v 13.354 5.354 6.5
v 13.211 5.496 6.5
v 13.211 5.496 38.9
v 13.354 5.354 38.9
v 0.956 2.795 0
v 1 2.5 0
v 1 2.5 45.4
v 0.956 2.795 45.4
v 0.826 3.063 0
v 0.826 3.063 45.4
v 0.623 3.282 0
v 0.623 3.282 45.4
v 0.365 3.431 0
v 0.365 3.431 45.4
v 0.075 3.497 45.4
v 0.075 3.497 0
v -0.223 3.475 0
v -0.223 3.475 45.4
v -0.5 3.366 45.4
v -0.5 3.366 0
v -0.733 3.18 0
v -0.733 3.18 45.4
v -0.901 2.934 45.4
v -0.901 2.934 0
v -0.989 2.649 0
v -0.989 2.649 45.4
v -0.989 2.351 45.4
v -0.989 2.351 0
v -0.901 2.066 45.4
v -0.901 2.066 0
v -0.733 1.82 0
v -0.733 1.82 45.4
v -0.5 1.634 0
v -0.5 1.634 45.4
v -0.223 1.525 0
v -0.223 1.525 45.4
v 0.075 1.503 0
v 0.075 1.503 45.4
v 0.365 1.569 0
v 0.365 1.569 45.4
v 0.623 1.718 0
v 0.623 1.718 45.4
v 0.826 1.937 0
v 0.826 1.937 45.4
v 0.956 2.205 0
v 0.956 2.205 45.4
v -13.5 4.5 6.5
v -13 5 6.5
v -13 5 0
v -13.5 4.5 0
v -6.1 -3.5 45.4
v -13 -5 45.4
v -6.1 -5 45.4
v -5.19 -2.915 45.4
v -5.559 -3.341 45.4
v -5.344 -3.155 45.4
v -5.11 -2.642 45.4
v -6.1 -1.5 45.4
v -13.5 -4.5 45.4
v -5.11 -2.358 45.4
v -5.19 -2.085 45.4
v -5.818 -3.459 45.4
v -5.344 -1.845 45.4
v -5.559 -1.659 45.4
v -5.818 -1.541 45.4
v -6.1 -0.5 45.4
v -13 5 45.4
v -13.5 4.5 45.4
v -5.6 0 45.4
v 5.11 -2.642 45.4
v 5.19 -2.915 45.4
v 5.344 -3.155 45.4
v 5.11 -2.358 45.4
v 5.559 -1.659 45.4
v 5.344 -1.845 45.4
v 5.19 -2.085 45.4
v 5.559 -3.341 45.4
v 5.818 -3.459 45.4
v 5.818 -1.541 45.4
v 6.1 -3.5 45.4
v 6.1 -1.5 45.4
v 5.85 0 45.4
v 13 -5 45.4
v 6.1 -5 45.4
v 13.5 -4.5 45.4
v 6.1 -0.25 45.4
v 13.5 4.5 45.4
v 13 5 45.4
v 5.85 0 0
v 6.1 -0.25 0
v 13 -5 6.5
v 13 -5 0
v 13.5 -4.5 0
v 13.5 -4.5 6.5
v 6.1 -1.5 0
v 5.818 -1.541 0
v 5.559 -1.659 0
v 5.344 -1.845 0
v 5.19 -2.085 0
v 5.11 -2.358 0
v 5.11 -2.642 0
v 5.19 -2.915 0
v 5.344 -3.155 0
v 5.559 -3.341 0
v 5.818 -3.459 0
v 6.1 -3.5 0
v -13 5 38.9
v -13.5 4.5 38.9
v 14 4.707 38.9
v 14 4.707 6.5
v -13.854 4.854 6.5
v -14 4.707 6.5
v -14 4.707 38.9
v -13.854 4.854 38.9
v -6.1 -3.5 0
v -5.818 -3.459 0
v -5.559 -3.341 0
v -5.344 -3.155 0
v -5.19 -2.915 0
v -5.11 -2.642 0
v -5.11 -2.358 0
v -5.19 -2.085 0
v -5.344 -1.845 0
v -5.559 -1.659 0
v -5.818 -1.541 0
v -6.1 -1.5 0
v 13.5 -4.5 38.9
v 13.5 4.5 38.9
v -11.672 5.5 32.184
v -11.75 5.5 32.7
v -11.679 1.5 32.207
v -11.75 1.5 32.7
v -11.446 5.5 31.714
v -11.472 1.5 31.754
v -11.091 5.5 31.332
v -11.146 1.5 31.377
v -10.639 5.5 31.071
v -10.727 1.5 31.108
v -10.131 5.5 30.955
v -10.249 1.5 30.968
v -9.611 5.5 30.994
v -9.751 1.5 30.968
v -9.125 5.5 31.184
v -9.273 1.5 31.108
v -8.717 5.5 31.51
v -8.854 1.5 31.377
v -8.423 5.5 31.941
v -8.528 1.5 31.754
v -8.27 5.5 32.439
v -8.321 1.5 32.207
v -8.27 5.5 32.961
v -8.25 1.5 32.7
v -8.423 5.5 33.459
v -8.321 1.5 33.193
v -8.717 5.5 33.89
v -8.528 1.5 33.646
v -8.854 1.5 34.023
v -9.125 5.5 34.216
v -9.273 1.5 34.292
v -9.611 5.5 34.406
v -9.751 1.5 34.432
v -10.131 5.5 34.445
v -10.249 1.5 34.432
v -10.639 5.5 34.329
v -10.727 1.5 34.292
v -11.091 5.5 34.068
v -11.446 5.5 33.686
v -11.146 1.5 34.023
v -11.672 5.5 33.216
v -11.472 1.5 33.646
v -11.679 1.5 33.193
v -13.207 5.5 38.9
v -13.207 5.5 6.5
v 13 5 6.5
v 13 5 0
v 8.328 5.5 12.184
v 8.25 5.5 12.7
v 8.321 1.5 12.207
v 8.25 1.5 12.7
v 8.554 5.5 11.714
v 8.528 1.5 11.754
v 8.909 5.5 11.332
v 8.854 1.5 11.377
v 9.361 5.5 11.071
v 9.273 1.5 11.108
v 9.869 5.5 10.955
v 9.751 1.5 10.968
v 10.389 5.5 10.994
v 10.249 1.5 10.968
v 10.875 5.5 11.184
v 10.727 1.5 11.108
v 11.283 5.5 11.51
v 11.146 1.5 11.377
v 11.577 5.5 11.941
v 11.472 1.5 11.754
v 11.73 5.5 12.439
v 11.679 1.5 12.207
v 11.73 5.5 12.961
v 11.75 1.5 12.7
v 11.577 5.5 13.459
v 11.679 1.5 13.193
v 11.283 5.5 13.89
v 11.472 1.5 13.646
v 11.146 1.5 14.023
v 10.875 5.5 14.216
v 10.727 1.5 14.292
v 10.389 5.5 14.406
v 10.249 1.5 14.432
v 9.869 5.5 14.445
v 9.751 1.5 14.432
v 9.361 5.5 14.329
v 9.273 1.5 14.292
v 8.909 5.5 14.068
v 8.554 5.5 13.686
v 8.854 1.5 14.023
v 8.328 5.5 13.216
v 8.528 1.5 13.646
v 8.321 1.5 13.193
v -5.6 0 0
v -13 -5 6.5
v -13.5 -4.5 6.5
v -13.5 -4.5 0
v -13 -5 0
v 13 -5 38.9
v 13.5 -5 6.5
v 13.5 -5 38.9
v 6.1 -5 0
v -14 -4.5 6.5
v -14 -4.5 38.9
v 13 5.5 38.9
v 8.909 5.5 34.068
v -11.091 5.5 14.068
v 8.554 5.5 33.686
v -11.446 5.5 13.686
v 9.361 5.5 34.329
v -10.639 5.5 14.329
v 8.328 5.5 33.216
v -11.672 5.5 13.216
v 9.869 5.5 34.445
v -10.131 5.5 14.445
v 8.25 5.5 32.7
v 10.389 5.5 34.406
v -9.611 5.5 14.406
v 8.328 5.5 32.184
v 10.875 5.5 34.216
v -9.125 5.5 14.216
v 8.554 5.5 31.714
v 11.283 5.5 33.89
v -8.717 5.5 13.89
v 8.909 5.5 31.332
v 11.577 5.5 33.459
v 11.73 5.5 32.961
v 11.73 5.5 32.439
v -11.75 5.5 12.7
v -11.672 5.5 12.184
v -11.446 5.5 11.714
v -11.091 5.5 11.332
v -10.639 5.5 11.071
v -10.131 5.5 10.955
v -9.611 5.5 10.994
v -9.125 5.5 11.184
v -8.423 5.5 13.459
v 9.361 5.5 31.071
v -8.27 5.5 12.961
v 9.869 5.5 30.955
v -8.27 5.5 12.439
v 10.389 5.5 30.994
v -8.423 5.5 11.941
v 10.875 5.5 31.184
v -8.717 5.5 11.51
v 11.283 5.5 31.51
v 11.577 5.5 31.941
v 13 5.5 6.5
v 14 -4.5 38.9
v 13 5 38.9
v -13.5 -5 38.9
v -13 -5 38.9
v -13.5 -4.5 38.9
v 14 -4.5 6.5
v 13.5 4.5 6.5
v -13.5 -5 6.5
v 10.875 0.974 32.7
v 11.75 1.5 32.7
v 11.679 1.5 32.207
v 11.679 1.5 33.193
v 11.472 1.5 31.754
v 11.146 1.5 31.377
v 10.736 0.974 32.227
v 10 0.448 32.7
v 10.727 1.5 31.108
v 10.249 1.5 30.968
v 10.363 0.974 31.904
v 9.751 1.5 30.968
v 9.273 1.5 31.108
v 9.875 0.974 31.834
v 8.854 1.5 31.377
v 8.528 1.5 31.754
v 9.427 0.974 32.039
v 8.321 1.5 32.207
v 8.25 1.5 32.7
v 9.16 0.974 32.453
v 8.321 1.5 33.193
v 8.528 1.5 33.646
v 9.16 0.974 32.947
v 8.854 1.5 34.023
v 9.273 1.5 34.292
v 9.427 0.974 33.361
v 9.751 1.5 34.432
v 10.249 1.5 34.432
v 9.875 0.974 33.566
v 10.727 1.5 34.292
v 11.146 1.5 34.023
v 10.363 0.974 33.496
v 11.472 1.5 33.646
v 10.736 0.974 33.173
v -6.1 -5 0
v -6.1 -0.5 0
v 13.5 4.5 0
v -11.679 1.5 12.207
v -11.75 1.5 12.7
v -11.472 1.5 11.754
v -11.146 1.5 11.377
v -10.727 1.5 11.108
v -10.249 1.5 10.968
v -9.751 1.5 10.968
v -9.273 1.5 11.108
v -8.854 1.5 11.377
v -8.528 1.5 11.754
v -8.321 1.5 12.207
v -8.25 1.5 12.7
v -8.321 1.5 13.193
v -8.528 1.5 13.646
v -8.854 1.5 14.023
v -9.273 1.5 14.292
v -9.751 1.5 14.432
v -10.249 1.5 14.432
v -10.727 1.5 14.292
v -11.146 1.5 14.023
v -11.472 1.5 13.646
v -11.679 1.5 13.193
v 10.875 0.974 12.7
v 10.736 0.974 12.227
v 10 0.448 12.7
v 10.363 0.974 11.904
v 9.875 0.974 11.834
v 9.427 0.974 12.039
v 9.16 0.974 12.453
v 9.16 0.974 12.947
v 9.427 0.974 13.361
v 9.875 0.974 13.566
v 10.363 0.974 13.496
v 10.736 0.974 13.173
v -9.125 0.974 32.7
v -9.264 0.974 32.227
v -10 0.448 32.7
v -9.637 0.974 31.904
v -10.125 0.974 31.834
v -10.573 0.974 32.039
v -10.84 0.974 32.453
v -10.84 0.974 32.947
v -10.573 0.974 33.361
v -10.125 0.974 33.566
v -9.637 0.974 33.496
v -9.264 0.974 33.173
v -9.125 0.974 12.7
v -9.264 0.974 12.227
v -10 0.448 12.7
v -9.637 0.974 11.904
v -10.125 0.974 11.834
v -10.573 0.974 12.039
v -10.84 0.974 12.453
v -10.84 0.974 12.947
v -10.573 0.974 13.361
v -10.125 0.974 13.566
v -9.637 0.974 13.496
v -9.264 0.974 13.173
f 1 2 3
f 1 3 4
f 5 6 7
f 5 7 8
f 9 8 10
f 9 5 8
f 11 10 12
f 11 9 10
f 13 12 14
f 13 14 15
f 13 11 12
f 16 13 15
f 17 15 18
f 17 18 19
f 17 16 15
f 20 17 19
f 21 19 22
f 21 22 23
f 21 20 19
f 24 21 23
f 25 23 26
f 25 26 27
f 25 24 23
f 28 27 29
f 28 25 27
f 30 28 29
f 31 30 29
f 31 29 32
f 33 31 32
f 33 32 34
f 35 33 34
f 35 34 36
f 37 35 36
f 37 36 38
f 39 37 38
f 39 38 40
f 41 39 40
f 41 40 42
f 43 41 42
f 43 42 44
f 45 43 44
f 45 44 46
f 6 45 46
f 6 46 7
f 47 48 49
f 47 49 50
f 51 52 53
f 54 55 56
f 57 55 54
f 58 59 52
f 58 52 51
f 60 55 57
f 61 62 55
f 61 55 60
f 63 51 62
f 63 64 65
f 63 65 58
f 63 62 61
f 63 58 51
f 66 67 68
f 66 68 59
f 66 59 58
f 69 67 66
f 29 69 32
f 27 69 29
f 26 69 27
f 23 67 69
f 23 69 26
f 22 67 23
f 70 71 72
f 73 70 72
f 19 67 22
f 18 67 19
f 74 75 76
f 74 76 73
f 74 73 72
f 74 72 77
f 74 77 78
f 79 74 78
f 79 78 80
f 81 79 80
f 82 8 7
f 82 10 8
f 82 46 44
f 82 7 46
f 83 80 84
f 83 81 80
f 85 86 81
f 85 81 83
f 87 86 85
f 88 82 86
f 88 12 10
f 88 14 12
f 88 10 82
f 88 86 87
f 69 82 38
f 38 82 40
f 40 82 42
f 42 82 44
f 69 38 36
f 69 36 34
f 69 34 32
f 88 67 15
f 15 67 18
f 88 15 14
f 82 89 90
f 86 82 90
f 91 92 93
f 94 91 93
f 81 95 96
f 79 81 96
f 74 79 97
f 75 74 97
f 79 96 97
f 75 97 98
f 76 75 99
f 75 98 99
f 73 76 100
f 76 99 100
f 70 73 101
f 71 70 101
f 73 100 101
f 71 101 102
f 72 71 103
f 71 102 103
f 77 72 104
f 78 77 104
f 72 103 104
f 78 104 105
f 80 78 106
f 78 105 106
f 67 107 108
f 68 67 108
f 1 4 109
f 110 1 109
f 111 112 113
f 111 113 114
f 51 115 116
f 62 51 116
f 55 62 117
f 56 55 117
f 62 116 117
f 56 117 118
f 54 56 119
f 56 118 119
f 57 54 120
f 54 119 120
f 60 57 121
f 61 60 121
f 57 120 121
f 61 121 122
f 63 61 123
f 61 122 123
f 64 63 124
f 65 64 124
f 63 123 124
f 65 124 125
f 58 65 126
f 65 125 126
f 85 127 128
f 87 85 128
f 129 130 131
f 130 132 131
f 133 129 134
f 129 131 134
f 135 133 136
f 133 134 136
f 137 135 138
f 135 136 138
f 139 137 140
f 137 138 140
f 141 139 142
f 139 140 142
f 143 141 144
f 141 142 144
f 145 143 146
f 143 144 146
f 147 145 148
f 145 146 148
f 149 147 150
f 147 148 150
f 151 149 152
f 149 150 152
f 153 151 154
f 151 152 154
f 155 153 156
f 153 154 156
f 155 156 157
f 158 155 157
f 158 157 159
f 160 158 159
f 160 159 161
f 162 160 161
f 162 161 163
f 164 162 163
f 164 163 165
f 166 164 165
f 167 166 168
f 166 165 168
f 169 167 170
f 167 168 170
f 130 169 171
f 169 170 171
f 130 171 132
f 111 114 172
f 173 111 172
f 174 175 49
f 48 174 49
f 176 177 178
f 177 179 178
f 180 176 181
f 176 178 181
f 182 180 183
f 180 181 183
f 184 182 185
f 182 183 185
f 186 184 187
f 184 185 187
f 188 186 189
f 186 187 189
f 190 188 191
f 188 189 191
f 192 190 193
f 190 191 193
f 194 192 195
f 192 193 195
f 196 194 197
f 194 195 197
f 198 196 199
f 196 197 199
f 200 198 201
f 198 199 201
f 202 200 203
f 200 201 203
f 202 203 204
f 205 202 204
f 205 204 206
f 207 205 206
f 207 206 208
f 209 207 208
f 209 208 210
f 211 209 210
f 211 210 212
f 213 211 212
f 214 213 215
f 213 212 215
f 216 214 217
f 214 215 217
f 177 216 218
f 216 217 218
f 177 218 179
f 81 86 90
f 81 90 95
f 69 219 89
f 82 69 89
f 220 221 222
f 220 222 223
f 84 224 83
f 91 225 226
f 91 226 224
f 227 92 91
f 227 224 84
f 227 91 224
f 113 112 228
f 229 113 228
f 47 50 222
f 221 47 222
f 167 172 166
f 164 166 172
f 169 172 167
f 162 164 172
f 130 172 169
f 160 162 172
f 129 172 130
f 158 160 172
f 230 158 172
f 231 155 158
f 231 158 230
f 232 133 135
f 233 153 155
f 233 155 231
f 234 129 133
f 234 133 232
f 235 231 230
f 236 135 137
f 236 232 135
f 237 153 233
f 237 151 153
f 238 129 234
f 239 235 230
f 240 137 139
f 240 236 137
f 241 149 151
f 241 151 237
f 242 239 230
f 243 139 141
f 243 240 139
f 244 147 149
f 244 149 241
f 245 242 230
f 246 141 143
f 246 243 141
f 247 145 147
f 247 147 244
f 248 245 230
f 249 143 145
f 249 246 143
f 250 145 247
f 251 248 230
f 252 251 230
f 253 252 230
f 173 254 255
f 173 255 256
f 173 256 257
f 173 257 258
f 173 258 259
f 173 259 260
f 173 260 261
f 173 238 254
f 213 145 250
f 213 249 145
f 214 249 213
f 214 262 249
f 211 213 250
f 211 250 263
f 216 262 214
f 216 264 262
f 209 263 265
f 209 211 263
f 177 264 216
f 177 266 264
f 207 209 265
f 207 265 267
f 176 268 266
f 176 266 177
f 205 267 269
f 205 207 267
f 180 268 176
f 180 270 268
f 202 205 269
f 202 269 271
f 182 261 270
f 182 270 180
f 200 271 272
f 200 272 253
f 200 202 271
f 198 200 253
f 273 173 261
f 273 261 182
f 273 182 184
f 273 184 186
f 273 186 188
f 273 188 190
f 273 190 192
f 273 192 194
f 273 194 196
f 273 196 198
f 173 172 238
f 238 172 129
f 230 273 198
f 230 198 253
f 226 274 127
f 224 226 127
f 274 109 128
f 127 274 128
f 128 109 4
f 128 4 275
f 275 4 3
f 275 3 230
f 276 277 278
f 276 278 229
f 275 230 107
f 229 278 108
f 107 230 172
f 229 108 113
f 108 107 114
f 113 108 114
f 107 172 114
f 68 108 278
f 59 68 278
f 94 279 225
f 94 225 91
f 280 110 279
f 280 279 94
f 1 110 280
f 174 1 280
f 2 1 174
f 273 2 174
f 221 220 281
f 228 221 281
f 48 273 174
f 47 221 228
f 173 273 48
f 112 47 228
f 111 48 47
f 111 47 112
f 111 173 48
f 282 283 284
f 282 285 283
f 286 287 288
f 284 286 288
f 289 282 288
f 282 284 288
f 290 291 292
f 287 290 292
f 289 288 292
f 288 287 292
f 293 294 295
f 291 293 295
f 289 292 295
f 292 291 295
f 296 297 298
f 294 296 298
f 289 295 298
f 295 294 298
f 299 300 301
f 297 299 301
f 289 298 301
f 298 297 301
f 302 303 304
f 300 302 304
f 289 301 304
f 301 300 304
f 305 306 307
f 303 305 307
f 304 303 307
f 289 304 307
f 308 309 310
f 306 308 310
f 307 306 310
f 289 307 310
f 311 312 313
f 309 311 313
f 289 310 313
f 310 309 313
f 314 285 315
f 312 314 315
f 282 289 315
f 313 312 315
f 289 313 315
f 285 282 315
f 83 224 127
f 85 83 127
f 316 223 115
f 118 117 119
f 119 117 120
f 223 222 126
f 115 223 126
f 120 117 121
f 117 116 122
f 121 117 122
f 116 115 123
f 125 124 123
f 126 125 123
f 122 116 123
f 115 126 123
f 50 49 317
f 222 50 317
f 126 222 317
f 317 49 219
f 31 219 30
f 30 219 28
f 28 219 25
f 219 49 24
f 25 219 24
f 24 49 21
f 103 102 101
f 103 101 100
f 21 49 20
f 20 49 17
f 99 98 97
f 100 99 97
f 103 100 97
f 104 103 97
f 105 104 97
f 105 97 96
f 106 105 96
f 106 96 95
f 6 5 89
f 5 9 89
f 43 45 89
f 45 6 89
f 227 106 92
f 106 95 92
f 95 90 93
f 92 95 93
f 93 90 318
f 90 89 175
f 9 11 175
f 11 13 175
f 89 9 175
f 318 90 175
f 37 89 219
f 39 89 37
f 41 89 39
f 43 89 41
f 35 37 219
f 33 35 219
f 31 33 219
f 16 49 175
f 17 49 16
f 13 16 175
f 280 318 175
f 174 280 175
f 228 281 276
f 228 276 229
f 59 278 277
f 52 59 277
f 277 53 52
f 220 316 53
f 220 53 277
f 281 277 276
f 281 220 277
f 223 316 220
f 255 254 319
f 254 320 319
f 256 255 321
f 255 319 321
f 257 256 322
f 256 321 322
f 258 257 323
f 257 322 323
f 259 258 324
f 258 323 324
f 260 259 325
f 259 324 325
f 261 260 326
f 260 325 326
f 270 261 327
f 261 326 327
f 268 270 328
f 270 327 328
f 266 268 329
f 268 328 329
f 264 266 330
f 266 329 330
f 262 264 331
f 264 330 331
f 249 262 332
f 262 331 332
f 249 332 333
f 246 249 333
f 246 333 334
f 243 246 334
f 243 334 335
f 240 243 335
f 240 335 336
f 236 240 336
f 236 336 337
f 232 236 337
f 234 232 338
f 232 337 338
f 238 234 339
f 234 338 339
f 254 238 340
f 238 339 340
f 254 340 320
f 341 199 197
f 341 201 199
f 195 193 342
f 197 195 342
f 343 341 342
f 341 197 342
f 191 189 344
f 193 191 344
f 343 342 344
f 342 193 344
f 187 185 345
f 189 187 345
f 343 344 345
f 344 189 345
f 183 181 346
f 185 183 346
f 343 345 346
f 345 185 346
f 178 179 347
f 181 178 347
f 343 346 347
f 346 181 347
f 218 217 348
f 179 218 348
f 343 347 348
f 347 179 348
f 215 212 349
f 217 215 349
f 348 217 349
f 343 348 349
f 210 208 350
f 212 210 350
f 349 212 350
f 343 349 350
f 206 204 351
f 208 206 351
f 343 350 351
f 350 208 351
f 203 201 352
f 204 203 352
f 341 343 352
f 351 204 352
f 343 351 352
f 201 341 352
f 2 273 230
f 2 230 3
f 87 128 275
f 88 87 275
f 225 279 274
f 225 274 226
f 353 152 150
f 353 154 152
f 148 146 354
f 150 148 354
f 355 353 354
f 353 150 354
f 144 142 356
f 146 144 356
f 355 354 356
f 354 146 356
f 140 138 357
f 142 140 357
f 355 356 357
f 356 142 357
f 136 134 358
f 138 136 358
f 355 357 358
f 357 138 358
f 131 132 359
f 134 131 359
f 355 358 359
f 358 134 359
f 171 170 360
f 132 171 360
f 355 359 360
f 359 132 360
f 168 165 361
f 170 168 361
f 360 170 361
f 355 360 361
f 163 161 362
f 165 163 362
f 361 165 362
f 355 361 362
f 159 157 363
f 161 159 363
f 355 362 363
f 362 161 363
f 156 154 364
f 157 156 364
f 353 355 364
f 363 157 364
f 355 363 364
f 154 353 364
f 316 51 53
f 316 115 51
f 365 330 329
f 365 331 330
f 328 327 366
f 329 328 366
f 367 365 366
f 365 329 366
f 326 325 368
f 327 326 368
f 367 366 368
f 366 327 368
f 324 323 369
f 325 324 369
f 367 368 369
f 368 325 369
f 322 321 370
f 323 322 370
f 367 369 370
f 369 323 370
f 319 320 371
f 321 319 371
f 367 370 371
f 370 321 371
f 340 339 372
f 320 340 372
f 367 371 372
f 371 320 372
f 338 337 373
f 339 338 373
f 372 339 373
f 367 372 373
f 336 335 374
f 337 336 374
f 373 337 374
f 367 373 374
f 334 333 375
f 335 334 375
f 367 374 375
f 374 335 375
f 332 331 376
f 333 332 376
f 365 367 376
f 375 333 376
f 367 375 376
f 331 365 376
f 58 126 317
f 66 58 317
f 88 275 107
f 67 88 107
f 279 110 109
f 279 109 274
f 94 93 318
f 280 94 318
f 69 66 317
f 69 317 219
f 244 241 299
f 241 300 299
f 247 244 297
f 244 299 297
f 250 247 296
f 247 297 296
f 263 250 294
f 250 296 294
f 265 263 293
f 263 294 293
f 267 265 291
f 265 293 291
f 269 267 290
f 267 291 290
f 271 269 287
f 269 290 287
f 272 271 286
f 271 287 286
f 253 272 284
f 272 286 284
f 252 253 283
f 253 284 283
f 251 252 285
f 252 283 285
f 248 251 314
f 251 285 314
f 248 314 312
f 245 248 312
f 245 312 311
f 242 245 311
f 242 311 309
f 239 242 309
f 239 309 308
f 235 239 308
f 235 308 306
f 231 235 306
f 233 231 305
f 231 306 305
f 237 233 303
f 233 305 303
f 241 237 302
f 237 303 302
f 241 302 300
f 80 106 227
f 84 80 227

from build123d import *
from build123d.topology import SkipClean

# Parameters (mm, degrees)
SKETCH1_R                 = 1
BOSS_EXTRUDE1_DEPTH       = 45.4
BOSS_EXTRUDE2_START       = -38.9
SKETCH5_R                 = 1
BOSS_EXTRUDE2_DEPTH       = 32.4
M5X0_8_TAPPED_HOLE1_D     = 3.5
M5X0_8_TAPPED_HOLE1_DEPTH = 4
M5X0_8_TAPPED_HOLE1_TIP   = 1.051506083


with BuildPart() as part:
    # Sketch1 → Boss-Extrude1 (new body)
    with BuildSketch(Plane.XY):
        with BuildLine():
            Line((-13.5, -4.5), (-13, -5))
            Line((-13, -5), (-6.1, -5))
            Line((-6.1, -5), (-6.1, -3.5))
            ThreePointArc((-6.1, -3.5), (-5.1, -2.5), (-6.1, -1.5))
            Line((-6.1, -1.5), (-6.1, -0.5))
            Line((-6.1, -0.5), (-5.6, 0))
            Line((-5.6, 0), (5.85, 0))
            Line((5.85, 0), (6.1, -0.25))
            Line((6.1, -0.25), (6.1, -1.5))
            ThreePointArc((6.1, -1.5), (5.1, -2.5), (6.1, -3.5))
            Line((6.1, -3.5), (6.1, -5))
            Line((6.1, -5), (13, -5))
            Line((13, -5), (13.5, -4.5))
            Line((13.5, -4.5), (13.5, 4.5))
            Line((13.5, 4.5), (13, 5))
            Line((13, 5), (-13, 5))
            Line((-13, 5), (-13.5, 4.5))
            Line((-13.5, 4.5), (-13.5, -4.5))
        make_face()
        with Locations((0, 2.5)):
            Circle(SKETCH1_R, mode=Mode.SUBTRACT)
    extrude(amount=BOSS_EXTRUDE1_DEPTH)

    # Sketch5 → Boss-Extrude2 (add)
    with SkipClean():  # the faces are left unmerged after this step: merging them gives an invalid solid
        with BuildSketch(Plane.XY.offset(45.4).offset(BOSS_EXTRUDE2_START)):
            with BuildLine():
                Line((13, 5.5), (13.210808273, 5.496298508))
                Line((13.210808273, 5.496298508), (13.353553391, 5.353553391))
                Line((13.353553391, 5.353553391), (14, 4.707106781))
                Line((14, 4.707106781), (14, -4.5))
                Line((14, -4.5), (13.5, -5))
                Line((13.5, -5), (6.1, -5))
                Line((6.1, -5), (6.1, -3.5))
                ThreePointArc((6.1, -3.5), (5.1, -2.5), (6.1, -1.5))
                Line((6.1, -1.5), (6.1, -0.25))
                Line((6.1, -0.25), (5.85, 0))
                Line((5.85, 0), (-5.6, 0))
                Line((-5.6, 0), (-6.1, -0.5))
                Line((-6.1, -0.5), (-6.1, -1.5))
                ThreePointArc((-6.1, -1.5), (-5.1, -2.5), (-6.1, -3.5))
                Line((-6.1, -3.5), (-6.1, -5))
                Line((-6.1, -5), (-13.5, -5))
                Line((-13.5, -5), (-14, -4.5))
                Line((-14, -4.5), (-14, 4.5))
                Line((-14, 4.5), (-14, 4.707106781))
                Line((-14, 4.707106781), (-13.853553391, 4.853553391))
                Line((-13.853553391, 4.853553391), (-13.207106781, 5.5))
                Line((-13.207106781, 5.5), (13, 5.5))
            make_face()
            with Locations((0, 2.5)):
                Circle(SKETCH5_R, mode=Mode.SUBTRACT)
        extrude(amount=BOSS_EXTRUDE2_DEPTH)
    add(part.part.scale(1), mode=Mode.REPLACE)  # the faces are merged on a copy

    # M5x0.8 Tapped Hole1
    with Locations(Plane(origin=(0, 5.5, 0), x_dir=(1, 0, 0), z_dir=(0, 1, 0))):
        with Locations((-10, -12.7), (-10, -32.7), (10, -32.7), (10, -12.7)):
            Hole(M5X0_8_TAPPED_HOLE1_D / 2, depth=M5X0_8_TAPPED_HOLE1_DEPTH)
            with Locations((0, 0, -(M5X0_8_TAPPED_HOLE1_DEPTH + M5X0_8_TAPPED_HOLE1_TIP / 2))):  # 118° drill point
                Cone(0, M5X0_8_TAPPED_HOLE1_D / 2, M5X0_8_TAPPED_HOLE1_TIP, mode=Mode.SUBTRACT)


solid = part.part
